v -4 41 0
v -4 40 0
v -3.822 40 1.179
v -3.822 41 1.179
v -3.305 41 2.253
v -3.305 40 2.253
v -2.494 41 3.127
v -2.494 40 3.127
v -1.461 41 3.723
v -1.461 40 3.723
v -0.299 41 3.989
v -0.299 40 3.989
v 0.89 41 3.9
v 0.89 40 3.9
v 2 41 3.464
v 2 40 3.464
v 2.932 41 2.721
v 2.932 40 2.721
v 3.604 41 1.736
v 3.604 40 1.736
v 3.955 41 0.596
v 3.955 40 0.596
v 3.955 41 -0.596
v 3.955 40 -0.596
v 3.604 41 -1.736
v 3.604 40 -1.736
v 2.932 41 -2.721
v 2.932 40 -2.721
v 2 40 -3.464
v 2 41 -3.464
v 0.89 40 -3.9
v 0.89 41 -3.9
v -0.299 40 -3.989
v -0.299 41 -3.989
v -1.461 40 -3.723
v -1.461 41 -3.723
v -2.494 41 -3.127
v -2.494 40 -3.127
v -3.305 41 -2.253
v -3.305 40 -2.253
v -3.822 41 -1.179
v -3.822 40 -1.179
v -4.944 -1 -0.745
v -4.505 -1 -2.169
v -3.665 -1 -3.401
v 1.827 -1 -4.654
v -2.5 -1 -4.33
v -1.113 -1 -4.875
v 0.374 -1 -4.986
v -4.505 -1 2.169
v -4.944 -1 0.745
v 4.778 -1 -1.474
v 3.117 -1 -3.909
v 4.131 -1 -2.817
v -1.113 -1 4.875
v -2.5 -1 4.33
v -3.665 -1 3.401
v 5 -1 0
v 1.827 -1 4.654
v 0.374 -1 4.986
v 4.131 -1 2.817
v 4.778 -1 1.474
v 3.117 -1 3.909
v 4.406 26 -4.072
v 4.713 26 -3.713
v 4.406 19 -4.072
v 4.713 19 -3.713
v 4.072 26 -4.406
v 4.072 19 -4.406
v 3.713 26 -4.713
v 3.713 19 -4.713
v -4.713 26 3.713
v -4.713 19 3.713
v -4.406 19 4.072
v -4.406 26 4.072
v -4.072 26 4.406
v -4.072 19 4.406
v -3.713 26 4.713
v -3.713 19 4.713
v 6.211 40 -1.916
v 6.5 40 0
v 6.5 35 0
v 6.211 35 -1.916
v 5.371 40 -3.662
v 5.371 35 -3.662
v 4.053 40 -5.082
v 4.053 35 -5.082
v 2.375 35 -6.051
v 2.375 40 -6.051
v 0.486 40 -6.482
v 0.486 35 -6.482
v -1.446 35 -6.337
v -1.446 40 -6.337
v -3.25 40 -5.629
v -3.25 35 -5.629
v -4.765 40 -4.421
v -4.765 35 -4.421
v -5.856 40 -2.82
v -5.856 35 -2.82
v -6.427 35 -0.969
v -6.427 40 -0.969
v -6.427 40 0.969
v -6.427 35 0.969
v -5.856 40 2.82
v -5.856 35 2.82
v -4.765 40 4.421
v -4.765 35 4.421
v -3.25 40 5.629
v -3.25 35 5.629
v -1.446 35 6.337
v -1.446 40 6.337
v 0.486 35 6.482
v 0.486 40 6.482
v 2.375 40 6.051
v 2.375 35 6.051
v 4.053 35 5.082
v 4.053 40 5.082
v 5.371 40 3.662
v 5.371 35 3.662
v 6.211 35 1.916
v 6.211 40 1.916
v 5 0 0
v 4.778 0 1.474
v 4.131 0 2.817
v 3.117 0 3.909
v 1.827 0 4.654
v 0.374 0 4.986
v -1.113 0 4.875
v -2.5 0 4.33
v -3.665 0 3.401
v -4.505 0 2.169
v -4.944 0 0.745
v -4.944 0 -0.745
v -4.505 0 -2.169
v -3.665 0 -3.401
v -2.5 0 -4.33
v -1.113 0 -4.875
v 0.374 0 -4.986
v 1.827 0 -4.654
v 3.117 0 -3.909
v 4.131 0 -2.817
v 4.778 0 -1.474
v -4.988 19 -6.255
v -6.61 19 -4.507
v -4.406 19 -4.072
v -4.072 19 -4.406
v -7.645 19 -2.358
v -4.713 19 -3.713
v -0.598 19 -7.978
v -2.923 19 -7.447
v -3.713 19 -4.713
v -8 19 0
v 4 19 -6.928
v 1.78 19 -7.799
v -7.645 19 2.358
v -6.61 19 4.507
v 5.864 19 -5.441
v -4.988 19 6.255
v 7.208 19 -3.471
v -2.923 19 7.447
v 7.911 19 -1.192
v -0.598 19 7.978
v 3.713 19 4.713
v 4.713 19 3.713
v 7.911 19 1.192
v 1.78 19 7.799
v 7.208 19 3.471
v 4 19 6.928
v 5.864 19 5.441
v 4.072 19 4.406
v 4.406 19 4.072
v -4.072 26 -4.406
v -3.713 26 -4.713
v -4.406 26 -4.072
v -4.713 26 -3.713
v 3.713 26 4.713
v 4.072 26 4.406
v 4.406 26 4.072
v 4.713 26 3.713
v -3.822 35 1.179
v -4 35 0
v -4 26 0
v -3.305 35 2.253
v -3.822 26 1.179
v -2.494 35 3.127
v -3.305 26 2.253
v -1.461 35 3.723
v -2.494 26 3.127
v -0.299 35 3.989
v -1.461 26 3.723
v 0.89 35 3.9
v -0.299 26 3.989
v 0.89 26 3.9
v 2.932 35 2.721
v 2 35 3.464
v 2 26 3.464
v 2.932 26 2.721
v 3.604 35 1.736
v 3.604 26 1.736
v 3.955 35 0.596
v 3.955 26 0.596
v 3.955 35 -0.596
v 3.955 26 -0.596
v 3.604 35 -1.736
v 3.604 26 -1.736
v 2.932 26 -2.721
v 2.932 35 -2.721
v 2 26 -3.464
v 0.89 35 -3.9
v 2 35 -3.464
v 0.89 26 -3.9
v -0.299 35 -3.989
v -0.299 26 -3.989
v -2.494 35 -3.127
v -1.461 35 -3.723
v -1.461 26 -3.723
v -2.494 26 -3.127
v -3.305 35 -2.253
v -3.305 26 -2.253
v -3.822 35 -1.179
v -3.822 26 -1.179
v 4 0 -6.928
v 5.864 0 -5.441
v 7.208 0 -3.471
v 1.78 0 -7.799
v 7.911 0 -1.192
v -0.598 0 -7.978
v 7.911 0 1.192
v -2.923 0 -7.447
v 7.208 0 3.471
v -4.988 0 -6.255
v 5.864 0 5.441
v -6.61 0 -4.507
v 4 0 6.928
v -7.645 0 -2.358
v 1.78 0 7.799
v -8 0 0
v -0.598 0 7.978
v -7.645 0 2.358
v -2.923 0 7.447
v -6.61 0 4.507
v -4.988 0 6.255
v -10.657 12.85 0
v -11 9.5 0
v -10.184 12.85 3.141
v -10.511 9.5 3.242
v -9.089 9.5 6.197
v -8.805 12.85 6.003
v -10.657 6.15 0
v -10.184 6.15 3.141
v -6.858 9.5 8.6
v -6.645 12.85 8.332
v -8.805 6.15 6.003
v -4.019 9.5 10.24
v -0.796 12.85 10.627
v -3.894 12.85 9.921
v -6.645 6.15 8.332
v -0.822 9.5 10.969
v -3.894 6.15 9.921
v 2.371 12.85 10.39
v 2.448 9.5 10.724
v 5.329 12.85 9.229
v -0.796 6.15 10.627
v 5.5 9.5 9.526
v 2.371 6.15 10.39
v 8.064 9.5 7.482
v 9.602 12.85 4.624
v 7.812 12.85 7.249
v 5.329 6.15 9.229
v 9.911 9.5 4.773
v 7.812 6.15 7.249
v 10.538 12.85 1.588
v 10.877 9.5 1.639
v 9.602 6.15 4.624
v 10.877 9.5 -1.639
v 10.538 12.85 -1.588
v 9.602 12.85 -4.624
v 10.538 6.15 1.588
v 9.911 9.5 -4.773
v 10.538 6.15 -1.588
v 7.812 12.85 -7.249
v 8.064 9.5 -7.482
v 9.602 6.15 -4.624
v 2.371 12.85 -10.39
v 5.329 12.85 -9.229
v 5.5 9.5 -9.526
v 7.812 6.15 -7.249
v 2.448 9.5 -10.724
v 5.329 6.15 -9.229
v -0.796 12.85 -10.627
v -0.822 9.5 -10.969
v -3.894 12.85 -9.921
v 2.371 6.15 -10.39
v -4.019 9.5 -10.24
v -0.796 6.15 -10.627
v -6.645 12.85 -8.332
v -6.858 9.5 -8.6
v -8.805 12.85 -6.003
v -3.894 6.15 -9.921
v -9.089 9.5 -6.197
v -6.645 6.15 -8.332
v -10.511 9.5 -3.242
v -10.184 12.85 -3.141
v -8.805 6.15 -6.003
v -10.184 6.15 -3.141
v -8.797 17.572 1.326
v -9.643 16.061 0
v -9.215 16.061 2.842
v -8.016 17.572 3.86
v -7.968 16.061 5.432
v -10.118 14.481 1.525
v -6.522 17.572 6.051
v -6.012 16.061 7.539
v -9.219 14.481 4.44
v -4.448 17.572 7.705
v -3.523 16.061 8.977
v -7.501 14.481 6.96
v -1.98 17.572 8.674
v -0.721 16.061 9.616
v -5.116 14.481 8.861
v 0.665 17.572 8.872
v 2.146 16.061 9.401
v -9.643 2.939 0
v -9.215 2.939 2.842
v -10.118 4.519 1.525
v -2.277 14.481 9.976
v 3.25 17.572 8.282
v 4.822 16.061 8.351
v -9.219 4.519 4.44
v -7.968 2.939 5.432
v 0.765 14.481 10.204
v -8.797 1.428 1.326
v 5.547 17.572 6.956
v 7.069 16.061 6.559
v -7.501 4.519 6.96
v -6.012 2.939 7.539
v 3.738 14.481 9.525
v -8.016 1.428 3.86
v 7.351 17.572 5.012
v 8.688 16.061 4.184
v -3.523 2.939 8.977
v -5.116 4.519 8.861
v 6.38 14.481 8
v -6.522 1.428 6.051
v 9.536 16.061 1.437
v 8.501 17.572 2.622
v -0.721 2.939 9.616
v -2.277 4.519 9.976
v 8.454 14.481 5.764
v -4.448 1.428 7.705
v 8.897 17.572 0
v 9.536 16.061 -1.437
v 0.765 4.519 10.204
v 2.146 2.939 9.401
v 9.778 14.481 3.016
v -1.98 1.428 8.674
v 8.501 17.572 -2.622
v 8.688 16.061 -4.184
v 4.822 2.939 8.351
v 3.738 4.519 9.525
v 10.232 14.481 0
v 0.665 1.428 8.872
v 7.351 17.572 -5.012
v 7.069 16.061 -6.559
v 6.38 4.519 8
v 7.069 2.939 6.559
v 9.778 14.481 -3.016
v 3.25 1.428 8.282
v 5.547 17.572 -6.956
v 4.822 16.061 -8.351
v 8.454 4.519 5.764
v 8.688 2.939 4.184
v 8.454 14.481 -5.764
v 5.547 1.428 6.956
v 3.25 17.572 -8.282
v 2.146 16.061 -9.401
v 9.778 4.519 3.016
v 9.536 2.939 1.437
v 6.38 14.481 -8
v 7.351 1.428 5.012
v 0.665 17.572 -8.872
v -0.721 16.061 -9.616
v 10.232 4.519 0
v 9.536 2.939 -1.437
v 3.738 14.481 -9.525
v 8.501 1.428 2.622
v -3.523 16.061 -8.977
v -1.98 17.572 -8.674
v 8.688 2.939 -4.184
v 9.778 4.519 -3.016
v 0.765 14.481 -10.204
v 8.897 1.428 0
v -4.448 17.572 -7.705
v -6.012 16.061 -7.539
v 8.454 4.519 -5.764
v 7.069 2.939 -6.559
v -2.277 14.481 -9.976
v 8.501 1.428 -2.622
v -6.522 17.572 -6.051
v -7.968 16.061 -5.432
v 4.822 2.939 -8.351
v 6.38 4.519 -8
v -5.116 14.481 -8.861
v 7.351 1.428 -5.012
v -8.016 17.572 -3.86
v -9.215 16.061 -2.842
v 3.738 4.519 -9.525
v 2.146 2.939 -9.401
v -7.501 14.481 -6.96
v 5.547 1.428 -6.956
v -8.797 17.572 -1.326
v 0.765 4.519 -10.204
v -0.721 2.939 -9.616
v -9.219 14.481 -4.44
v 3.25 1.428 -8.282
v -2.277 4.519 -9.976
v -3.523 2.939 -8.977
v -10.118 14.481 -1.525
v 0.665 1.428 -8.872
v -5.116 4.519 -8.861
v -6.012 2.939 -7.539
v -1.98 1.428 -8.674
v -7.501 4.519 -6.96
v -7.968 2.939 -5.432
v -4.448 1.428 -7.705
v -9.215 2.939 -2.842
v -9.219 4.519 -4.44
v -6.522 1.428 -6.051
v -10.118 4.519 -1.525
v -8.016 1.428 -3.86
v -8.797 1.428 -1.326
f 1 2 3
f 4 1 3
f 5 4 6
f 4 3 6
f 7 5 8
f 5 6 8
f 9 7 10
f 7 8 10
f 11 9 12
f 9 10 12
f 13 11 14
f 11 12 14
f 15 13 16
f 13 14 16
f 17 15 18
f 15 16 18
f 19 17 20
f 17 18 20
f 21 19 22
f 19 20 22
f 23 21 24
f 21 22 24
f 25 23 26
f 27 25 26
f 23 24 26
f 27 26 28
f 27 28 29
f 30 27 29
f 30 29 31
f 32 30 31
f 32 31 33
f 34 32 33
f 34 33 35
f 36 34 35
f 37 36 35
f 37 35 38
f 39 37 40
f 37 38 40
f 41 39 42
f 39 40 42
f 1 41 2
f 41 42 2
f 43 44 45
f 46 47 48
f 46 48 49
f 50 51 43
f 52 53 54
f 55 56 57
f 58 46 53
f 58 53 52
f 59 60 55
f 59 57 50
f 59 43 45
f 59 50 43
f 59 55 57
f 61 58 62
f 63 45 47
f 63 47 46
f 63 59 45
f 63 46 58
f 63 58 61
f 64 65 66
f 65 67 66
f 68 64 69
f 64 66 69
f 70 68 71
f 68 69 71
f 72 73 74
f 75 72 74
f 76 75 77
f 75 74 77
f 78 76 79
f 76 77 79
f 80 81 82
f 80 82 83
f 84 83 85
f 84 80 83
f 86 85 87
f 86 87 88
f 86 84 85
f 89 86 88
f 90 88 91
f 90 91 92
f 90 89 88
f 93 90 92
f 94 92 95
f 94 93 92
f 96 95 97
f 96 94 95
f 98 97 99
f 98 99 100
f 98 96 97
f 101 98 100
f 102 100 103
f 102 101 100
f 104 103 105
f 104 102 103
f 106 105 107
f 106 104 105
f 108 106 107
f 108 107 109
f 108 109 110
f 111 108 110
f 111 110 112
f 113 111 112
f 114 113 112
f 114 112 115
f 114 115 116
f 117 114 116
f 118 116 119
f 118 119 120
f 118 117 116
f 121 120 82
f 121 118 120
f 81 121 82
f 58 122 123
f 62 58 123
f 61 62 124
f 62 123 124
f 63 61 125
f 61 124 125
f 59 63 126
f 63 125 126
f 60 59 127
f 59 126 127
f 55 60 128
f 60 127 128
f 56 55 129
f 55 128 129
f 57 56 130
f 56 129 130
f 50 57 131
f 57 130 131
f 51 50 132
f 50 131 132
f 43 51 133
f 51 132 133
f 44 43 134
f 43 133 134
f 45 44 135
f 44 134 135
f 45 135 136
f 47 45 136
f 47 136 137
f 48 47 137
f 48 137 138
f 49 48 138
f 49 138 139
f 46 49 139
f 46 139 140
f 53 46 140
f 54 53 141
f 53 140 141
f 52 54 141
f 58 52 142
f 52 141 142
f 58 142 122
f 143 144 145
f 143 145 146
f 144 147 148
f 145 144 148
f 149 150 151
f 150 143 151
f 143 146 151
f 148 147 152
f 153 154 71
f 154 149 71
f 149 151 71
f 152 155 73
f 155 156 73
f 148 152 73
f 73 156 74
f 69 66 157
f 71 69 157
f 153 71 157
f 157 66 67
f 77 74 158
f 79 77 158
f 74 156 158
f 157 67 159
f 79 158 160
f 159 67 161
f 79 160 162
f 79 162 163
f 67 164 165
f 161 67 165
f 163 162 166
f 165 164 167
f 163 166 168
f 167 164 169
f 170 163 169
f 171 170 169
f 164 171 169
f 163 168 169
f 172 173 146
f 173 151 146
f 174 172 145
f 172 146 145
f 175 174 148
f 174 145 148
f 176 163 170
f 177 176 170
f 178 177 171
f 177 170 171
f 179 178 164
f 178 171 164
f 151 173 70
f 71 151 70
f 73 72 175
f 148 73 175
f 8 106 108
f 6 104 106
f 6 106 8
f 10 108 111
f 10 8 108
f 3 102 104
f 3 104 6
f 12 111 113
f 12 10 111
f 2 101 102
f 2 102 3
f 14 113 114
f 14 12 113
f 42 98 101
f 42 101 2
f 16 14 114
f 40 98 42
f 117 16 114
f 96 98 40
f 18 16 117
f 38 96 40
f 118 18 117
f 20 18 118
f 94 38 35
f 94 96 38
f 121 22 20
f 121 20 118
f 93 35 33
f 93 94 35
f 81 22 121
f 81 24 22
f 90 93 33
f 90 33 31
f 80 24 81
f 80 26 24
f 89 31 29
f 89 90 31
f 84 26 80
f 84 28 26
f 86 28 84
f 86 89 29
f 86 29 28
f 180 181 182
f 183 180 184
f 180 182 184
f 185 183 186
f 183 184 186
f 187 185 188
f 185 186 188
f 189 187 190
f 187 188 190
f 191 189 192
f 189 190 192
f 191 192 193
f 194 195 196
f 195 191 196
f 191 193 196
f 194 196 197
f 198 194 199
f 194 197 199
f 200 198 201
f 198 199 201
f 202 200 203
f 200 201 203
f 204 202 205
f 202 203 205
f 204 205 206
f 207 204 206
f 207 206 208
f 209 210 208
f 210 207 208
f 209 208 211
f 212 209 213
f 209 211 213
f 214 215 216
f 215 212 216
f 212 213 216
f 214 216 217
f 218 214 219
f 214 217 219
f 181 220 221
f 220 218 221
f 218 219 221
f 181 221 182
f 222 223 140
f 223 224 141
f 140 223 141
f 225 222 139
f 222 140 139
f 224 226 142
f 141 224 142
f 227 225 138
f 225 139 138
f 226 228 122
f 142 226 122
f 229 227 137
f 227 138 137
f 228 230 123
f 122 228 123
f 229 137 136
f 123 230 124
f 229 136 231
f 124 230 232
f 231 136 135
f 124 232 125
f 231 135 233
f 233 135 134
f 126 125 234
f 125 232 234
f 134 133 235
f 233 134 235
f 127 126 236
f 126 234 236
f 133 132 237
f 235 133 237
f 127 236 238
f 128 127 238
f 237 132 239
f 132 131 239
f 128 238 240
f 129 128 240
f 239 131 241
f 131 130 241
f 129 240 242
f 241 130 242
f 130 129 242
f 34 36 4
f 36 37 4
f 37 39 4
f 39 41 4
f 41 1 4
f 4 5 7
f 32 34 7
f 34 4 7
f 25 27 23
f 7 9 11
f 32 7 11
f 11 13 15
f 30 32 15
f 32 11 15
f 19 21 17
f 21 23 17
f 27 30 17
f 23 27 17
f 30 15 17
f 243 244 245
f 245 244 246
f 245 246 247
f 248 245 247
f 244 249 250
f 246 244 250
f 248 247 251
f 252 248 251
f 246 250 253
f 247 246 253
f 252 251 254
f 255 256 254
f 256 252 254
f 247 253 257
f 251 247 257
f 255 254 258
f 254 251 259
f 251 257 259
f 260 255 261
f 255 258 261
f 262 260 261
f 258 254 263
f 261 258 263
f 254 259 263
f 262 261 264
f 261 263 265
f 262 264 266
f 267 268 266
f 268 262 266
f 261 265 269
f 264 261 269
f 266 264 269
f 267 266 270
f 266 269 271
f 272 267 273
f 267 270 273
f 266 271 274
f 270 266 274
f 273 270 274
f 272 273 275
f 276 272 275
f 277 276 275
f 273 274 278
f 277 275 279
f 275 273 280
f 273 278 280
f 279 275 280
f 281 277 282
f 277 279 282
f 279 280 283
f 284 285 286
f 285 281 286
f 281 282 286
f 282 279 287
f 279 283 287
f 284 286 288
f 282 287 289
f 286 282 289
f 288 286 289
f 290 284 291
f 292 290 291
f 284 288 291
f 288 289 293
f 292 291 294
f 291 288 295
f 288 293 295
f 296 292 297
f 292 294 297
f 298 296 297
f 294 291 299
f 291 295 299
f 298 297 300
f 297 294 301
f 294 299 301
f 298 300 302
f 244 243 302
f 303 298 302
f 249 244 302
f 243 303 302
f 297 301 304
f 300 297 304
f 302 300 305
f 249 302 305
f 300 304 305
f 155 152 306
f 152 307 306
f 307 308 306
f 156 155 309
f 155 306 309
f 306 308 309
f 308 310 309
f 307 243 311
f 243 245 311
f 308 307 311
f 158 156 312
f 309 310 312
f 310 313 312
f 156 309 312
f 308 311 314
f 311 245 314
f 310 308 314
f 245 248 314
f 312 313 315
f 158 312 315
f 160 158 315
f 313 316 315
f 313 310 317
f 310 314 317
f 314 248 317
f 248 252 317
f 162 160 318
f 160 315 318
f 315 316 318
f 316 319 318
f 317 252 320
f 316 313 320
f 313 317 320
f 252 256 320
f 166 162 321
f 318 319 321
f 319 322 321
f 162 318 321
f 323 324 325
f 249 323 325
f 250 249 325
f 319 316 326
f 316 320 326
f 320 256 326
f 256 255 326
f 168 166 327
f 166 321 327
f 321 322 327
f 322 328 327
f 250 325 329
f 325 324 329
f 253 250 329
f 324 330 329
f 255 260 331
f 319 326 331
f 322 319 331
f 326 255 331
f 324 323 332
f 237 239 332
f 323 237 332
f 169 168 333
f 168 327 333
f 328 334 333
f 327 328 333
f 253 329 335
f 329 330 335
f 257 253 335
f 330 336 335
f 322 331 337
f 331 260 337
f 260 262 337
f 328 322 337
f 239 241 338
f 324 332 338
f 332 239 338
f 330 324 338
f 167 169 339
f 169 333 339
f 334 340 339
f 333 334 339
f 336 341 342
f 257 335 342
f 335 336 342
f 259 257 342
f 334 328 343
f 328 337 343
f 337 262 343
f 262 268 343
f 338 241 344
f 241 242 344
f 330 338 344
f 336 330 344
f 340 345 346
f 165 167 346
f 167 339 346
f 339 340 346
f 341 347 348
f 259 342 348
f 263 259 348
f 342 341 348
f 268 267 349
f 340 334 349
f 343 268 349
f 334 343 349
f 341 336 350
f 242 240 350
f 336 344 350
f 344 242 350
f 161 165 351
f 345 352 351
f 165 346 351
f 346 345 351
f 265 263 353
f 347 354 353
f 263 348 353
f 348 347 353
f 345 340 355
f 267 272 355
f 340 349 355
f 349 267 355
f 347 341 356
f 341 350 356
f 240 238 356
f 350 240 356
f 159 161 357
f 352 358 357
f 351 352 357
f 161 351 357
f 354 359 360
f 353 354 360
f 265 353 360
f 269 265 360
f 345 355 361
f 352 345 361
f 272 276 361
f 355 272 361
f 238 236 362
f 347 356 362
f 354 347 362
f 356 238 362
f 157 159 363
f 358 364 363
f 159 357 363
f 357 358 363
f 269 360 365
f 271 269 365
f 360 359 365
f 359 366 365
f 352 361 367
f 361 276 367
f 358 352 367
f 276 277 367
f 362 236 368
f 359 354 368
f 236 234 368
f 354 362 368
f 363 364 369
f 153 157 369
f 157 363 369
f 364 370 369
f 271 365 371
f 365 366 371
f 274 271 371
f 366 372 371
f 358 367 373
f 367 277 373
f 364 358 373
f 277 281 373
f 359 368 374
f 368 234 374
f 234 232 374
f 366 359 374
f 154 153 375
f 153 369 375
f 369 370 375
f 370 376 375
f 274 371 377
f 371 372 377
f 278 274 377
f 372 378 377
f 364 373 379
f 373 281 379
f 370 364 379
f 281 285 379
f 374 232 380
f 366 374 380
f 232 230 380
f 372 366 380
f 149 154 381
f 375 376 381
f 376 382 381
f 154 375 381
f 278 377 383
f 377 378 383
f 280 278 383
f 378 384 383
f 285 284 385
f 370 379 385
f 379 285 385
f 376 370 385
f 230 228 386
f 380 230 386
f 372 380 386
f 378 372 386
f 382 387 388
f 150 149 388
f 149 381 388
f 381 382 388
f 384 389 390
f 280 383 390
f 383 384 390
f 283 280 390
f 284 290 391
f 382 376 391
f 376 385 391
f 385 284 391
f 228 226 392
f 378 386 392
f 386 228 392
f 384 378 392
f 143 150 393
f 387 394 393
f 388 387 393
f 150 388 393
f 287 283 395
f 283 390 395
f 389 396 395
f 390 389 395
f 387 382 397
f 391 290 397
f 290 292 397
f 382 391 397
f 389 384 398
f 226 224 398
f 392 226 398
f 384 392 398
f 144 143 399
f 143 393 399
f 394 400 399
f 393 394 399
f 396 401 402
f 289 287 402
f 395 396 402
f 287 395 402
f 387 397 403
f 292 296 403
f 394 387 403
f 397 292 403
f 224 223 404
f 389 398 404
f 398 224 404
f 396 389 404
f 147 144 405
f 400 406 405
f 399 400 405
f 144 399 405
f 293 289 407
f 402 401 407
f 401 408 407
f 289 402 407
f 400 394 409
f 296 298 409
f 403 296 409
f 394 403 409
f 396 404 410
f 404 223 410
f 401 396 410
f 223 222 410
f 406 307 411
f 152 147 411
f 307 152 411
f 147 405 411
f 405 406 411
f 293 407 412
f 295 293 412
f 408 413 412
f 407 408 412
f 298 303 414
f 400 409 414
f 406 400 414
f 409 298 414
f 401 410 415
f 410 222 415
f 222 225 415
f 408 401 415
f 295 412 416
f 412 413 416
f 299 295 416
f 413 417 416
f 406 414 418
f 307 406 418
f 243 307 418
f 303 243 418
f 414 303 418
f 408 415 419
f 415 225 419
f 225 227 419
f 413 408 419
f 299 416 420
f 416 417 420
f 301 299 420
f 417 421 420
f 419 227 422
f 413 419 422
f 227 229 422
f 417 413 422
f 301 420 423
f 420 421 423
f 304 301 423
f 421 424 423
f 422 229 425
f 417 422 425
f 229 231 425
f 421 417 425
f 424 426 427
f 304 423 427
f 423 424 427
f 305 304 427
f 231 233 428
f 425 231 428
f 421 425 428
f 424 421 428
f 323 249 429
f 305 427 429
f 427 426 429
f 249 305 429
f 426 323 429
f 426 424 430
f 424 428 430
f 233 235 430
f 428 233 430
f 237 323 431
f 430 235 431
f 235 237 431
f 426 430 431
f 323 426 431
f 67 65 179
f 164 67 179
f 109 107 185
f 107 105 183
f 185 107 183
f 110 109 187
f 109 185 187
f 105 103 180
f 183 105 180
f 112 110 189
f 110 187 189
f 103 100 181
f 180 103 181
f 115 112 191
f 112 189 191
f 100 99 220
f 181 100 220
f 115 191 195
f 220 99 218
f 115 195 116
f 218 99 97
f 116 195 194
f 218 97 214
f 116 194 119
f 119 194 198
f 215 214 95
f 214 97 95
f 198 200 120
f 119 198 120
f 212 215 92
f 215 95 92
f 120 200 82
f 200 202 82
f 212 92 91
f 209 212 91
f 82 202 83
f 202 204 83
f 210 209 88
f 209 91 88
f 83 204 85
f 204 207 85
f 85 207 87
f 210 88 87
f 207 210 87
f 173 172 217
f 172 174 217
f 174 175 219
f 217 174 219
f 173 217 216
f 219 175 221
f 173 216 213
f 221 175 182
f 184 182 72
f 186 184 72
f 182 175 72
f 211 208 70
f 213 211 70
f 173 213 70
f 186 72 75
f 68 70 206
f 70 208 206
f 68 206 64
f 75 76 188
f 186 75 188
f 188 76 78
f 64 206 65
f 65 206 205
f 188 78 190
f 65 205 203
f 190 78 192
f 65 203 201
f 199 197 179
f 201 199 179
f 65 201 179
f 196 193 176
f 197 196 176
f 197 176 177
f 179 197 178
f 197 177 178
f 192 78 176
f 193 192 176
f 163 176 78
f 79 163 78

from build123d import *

# Parameters (mm, degrees)
CUT_EXTRUDE1_DEPTH  = 7
SKETCH3_R           = 5
BOSS_EXTRUDE1_DEPTH = 1
SKETCH4_R           = 6.5
BOSS_EXTRUDE2_DEPTH = 5


with BuildPart() as part:
    # Sketch1 → Revolve1 (revolve)
    with BuildSketch(Plane.XY):
        with BuildLine():
            Line((-8, 0), (0, 0))
            Line((0, 0), (0, 41))
            Line((0, 41), (-4, 41))
            Line((-4, 41), (-4, 26))
            Line((-4, 26), (-6, 26))
            Line((-6, 26), (-6, 19))
            Line((-6, 19), (-8, 19))
            ThreePointArc((-8, 19), (-11, 9.5), (-8, 0))
        make_face()
    revolve(axis=Axis((0, 0, 0), (0, 1, 0)))

    # Sketch2 → Cut-Extrude1 (cut)
    with BuildSketch(Plane(origin=(0, 26, 0), x_dir=(1, 0, 0), z_dir=(0, 1, 0))):
        with BuildLine():
            Line((-3.713074887, 4.713074887), (3.713074887, 4.713074887))
            ThreePointArc((3.713074887, 4.713074887), (0, 6), (-3.713074887, 4.713074887))
        make_face()
        with BuildLine():
            Line((4.713074887, 3.713074887), (4.713074887, -3.713074887))
            ThreePointArc((4.713074887, -3.713074887), (6, 0), (4.713074887, 3.713074887))
        make_face()
        with BuildLine():
            Line((3.713074887, -4.713074887), (-3.713074887, -4.713074887))
            ThreePointArc((-3.713074887, -4.713074887), (0, -6), (3.713074887, -4.713074887))
        make_face()
        with BuildLine():
            Line((-4.713074887, -3.713074887), (-4.713074887, 3.713074887))
            ThreePointArc((-4.713074887, 3.713074887), (-6, 0), (-4.713074887, -3.713074887))
        make_face()
    extrude(amount=-CUT_EXTRUDE1_DEPTH, mode=Mode.SUBTRACT)

    # Sketch3 → Boss-Extrude1 (add)
    with BuildSketch(Plane.XZ):
        Circle(SKETCH3_R)
    extrude(amount=BOSS_EXTRUDE1_DEPTH)

    # Sketch4 → Boss-Extrude2 (add)
    with BuildSketch(Plane(origin=(0, 40, 0), x_dir=(1, 0, 0), z_dir=(0, 1, 0))):
        Circle(SKETCH4_R)
    extrude(amount=-BOSS_EXTRUDE2_DEPTH)


solid = part.part
